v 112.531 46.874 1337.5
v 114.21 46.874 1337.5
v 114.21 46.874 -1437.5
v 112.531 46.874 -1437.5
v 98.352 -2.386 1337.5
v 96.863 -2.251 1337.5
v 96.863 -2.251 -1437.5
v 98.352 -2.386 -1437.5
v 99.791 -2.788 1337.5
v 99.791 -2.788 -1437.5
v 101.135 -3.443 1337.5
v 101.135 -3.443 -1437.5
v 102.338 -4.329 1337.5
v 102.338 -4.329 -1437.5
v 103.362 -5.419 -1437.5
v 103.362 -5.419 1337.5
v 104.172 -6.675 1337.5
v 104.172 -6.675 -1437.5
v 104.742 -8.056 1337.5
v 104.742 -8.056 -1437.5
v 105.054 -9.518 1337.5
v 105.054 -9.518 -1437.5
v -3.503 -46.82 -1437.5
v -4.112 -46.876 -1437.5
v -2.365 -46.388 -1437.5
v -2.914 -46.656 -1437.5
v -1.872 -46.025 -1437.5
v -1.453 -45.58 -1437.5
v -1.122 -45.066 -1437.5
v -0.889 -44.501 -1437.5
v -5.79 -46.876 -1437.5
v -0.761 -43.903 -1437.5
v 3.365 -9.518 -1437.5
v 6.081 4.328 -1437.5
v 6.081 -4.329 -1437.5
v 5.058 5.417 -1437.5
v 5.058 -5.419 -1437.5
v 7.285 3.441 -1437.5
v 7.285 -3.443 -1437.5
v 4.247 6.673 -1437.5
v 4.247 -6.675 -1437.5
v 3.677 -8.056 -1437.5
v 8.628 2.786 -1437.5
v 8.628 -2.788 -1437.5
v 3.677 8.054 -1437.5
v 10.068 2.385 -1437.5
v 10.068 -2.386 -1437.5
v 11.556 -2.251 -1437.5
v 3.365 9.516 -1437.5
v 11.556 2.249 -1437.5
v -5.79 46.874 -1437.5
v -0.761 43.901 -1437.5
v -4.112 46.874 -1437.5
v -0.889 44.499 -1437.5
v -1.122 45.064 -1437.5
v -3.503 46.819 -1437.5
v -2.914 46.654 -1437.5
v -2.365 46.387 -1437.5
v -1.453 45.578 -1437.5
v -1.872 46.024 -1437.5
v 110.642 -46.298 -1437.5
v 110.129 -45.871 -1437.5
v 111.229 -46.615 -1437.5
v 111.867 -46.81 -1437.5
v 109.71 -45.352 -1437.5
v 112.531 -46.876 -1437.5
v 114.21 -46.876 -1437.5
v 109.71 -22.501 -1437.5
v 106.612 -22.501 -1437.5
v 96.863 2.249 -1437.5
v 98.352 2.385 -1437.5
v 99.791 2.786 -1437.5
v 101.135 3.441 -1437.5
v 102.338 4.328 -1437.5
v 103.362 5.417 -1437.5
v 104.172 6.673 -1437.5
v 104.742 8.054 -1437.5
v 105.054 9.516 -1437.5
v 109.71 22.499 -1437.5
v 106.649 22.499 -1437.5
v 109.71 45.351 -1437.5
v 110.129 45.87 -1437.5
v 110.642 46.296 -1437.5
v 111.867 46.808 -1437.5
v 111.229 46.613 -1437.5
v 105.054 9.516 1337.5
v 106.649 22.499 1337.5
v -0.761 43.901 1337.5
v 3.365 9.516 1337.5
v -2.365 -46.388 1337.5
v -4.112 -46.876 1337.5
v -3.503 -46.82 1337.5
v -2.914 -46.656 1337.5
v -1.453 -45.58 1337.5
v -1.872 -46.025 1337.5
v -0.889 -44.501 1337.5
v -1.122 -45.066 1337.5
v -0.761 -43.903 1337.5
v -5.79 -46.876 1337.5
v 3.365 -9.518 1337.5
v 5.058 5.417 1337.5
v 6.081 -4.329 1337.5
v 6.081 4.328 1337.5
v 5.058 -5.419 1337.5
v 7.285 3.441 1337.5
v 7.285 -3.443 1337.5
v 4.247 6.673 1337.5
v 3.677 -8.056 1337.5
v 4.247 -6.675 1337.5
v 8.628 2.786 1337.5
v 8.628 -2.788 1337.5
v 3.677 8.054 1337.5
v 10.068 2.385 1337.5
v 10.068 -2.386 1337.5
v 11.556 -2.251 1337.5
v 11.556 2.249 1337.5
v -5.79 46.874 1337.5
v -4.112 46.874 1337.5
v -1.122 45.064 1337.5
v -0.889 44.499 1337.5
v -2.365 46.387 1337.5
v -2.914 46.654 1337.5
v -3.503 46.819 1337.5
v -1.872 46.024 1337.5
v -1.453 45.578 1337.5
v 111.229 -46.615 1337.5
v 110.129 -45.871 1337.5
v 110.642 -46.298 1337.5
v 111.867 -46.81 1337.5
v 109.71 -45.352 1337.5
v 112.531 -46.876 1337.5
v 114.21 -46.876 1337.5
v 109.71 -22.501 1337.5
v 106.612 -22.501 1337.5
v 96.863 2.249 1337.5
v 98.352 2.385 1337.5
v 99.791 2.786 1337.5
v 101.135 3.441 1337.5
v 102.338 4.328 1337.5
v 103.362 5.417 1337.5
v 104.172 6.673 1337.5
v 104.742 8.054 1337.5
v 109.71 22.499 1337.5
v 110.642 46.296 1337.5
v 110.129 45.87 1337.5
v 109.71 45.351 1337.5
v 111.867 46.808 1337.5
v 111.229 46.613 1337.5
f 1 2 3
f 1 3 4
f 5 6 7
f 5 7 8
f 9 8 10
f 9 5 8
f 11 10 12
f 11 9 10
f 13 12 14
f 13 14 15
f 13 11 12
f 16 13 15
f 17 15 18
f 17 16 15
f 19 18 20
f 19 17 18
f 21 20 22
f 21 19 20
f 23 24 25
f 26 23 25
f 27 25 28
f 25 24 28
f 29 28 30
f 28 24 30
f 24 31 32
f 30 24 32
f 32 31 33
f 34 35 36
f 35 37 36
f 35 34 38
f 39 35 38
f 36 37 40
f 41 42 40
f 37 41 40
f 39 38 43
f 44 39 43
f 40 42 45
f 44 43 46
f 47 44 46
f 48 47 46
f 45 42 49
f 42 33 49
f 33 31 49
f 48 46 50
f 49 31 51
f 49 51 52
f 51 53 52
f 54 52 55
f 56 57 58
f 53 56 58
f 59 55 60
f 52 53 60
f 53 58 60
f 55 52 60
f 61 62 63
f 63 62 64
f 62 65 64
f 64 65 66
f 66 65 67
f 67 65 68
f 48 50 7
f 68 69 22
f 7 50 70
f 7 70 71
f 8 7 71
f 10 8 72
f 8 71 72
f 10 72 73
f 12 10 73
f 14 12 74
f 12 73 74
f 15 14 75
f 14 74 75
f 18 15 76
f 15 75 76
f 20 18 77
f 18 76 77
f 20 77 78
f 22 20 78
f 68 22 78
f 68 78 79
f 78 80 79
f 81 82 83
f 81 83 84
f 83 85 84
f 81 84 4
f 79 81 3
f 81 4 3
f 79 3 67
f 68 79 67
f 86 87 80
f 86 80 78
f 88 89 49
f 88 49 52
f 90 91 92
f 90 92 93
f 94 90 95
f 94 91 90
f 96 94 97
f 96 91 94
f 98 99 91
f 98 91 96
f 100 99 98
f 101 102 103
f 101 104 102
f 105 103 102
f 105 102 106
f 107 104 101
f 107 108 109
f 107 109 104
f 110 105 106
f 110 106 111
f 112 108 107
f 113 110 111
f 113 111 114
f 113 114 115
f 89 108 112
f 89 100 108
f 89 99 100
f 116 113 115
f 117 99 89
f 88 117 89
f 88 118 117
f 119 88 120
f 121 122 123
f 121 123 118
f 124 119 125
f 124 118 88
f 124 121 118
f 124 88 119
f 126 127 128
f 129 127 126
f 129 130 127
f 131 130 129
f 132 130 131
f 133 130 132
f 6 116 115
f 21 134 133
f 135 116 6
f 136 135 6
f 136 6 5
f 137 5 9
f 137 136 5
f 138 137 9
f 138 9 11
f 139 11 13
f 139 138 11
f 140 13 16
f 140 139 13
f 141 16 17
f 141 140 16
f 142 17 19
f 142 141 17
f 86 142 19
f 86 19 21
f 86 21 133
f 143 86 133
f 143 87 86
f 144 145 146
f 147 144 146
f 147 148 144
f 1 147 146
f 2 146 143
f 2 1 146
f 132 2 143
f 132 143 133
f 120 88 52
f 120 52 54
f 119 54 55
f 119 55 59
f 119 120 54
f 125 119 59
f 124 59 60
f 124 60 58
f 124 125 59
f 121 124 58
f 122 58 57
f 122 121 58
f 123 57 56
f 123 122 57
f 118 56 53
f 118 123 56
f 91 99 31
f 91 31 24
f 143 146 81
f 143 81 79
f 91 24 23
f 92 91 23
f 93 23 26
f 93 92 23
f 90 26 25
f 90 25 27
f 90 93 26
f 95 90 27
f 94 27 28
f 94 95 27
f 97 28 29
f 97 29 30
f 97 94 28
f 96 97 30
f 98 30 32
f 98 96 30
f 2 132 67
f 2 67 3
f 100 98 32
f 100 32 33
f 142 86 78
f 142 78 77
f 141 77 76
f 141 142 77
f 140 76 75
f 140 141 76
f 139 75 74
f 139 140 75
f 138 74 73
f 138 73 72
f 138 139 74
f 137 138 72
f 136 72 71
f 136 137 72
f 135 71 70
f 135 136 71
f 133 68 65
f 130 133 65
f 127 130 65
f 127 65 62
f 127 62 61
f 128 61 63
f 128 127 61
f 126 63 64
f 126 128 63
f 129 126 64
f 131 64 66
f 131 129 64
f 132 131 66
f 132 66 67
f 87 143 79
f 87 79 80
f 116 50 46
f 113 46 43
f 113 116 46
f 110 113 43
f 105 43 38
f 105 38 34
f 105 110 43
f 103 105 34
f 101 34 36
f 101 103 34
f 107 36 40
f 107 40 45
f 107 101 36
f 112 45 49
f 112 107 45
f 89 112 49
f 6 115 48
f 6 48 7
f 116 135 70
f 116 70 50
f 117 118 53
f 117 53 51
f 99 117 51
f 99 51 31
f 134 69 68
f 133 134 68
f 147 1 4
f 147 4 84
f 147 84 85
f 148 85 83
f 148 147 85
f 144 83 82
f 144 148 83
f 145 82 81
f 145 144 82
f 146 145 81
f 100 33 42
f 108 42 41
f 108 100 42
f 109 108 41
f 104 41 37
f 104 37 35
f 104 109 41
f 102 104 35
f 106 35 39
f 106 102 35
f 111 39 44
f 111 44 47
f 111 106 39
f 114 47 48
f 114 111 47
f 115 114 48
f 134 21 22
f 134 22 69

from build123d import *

# Parameters (mm, degrees)
BOSS_EXTRUDE1_DEPTH = 3700
SCALE1_SCALE        = 0.75


with BuildPart() as part:
    # Sketch1 → Boss-Extrude1 (new body)
    with BuildSketch(Plane.XY.offset(1800)):
        with BuildLine():
            Line((129, 60.46884946), (129, 30))
            Line((129, 30), (124.919748757, 30))
            Line((124.919748757, 30), (122.792728308, 12.689402566))
            ThreePointArc((122.792728308, 12.689402566), (119.171200489, 5.771495525), (111.871083085, 3))
            Line((111.871083085, 3), (-1.871083085, 3))
            ThreePointArc((-1.871083085, 3), (-9.171200492, 5.771495528), (-12.792728309, 12.689402573))
            Line((-12.792728309, 12.689402573), (-18.294338419, 58.536153493))
            ThreePointArc((-18.294338419, 58.536153493), (-19.775872526, 61.366206375), (-22.762284192, 62.5))
            Line((-22.762284192, 62.5), (-25, 62.5))
            Line((-25, 62.5), (-25, -62.5))
            Line((-25, -62.5), (-22.762284192, -62.5))
            ThreePointArc((-22.762284192, -62.5), (-19.775872526, -61.366206375), (-18.294338419, -58.536153493))
            Line((-18.294338419, -58.536153493), (-12.792728309, -12.689402573))
            ThreePointArc((-12.792728309, -12.689402573), (-9.171200492, -5.771495528), (-1.871083085, -3))
            Line((-1.871083085, -3), (111.871083085, -3))
            ThreePointArc((111.871083085, -3), (119.171200492, -5.771495528), (122.792728309, -12.689402573))
            Line((122.792728309, -12.689402573), (124.87, -30))
            Line((124.87, -30), (129, -30))
            Line((129, -30), (129, -60.46884946))
            ThreePointArc((129, -60.46884946), (130.62450761, -61.959786773), (132.762284192, -62.5))
            Line((132.762284192, -62.5), (135, -62.5))
            Line((135, -62.5), (135, 62.5))
            Line((135, 62.5), (132.762284192, 62.5))
            ThreePointArc((132.762284192, 62.5), (130.62450761, 61.959786773), (129, 60.46884946))
        make_face()
    extrude(amount=-BOSS_EXTRUDE1_DEPTH)


with BuildPart() as part_1:
    # Scale1: scaled about (51.838667986, -0.00324275, -50)
    add(part.part.scale(SCALE1_SCALE).moved(Location((12.959666996, -0.000810687, -12.5))))


solid = part_1.part
